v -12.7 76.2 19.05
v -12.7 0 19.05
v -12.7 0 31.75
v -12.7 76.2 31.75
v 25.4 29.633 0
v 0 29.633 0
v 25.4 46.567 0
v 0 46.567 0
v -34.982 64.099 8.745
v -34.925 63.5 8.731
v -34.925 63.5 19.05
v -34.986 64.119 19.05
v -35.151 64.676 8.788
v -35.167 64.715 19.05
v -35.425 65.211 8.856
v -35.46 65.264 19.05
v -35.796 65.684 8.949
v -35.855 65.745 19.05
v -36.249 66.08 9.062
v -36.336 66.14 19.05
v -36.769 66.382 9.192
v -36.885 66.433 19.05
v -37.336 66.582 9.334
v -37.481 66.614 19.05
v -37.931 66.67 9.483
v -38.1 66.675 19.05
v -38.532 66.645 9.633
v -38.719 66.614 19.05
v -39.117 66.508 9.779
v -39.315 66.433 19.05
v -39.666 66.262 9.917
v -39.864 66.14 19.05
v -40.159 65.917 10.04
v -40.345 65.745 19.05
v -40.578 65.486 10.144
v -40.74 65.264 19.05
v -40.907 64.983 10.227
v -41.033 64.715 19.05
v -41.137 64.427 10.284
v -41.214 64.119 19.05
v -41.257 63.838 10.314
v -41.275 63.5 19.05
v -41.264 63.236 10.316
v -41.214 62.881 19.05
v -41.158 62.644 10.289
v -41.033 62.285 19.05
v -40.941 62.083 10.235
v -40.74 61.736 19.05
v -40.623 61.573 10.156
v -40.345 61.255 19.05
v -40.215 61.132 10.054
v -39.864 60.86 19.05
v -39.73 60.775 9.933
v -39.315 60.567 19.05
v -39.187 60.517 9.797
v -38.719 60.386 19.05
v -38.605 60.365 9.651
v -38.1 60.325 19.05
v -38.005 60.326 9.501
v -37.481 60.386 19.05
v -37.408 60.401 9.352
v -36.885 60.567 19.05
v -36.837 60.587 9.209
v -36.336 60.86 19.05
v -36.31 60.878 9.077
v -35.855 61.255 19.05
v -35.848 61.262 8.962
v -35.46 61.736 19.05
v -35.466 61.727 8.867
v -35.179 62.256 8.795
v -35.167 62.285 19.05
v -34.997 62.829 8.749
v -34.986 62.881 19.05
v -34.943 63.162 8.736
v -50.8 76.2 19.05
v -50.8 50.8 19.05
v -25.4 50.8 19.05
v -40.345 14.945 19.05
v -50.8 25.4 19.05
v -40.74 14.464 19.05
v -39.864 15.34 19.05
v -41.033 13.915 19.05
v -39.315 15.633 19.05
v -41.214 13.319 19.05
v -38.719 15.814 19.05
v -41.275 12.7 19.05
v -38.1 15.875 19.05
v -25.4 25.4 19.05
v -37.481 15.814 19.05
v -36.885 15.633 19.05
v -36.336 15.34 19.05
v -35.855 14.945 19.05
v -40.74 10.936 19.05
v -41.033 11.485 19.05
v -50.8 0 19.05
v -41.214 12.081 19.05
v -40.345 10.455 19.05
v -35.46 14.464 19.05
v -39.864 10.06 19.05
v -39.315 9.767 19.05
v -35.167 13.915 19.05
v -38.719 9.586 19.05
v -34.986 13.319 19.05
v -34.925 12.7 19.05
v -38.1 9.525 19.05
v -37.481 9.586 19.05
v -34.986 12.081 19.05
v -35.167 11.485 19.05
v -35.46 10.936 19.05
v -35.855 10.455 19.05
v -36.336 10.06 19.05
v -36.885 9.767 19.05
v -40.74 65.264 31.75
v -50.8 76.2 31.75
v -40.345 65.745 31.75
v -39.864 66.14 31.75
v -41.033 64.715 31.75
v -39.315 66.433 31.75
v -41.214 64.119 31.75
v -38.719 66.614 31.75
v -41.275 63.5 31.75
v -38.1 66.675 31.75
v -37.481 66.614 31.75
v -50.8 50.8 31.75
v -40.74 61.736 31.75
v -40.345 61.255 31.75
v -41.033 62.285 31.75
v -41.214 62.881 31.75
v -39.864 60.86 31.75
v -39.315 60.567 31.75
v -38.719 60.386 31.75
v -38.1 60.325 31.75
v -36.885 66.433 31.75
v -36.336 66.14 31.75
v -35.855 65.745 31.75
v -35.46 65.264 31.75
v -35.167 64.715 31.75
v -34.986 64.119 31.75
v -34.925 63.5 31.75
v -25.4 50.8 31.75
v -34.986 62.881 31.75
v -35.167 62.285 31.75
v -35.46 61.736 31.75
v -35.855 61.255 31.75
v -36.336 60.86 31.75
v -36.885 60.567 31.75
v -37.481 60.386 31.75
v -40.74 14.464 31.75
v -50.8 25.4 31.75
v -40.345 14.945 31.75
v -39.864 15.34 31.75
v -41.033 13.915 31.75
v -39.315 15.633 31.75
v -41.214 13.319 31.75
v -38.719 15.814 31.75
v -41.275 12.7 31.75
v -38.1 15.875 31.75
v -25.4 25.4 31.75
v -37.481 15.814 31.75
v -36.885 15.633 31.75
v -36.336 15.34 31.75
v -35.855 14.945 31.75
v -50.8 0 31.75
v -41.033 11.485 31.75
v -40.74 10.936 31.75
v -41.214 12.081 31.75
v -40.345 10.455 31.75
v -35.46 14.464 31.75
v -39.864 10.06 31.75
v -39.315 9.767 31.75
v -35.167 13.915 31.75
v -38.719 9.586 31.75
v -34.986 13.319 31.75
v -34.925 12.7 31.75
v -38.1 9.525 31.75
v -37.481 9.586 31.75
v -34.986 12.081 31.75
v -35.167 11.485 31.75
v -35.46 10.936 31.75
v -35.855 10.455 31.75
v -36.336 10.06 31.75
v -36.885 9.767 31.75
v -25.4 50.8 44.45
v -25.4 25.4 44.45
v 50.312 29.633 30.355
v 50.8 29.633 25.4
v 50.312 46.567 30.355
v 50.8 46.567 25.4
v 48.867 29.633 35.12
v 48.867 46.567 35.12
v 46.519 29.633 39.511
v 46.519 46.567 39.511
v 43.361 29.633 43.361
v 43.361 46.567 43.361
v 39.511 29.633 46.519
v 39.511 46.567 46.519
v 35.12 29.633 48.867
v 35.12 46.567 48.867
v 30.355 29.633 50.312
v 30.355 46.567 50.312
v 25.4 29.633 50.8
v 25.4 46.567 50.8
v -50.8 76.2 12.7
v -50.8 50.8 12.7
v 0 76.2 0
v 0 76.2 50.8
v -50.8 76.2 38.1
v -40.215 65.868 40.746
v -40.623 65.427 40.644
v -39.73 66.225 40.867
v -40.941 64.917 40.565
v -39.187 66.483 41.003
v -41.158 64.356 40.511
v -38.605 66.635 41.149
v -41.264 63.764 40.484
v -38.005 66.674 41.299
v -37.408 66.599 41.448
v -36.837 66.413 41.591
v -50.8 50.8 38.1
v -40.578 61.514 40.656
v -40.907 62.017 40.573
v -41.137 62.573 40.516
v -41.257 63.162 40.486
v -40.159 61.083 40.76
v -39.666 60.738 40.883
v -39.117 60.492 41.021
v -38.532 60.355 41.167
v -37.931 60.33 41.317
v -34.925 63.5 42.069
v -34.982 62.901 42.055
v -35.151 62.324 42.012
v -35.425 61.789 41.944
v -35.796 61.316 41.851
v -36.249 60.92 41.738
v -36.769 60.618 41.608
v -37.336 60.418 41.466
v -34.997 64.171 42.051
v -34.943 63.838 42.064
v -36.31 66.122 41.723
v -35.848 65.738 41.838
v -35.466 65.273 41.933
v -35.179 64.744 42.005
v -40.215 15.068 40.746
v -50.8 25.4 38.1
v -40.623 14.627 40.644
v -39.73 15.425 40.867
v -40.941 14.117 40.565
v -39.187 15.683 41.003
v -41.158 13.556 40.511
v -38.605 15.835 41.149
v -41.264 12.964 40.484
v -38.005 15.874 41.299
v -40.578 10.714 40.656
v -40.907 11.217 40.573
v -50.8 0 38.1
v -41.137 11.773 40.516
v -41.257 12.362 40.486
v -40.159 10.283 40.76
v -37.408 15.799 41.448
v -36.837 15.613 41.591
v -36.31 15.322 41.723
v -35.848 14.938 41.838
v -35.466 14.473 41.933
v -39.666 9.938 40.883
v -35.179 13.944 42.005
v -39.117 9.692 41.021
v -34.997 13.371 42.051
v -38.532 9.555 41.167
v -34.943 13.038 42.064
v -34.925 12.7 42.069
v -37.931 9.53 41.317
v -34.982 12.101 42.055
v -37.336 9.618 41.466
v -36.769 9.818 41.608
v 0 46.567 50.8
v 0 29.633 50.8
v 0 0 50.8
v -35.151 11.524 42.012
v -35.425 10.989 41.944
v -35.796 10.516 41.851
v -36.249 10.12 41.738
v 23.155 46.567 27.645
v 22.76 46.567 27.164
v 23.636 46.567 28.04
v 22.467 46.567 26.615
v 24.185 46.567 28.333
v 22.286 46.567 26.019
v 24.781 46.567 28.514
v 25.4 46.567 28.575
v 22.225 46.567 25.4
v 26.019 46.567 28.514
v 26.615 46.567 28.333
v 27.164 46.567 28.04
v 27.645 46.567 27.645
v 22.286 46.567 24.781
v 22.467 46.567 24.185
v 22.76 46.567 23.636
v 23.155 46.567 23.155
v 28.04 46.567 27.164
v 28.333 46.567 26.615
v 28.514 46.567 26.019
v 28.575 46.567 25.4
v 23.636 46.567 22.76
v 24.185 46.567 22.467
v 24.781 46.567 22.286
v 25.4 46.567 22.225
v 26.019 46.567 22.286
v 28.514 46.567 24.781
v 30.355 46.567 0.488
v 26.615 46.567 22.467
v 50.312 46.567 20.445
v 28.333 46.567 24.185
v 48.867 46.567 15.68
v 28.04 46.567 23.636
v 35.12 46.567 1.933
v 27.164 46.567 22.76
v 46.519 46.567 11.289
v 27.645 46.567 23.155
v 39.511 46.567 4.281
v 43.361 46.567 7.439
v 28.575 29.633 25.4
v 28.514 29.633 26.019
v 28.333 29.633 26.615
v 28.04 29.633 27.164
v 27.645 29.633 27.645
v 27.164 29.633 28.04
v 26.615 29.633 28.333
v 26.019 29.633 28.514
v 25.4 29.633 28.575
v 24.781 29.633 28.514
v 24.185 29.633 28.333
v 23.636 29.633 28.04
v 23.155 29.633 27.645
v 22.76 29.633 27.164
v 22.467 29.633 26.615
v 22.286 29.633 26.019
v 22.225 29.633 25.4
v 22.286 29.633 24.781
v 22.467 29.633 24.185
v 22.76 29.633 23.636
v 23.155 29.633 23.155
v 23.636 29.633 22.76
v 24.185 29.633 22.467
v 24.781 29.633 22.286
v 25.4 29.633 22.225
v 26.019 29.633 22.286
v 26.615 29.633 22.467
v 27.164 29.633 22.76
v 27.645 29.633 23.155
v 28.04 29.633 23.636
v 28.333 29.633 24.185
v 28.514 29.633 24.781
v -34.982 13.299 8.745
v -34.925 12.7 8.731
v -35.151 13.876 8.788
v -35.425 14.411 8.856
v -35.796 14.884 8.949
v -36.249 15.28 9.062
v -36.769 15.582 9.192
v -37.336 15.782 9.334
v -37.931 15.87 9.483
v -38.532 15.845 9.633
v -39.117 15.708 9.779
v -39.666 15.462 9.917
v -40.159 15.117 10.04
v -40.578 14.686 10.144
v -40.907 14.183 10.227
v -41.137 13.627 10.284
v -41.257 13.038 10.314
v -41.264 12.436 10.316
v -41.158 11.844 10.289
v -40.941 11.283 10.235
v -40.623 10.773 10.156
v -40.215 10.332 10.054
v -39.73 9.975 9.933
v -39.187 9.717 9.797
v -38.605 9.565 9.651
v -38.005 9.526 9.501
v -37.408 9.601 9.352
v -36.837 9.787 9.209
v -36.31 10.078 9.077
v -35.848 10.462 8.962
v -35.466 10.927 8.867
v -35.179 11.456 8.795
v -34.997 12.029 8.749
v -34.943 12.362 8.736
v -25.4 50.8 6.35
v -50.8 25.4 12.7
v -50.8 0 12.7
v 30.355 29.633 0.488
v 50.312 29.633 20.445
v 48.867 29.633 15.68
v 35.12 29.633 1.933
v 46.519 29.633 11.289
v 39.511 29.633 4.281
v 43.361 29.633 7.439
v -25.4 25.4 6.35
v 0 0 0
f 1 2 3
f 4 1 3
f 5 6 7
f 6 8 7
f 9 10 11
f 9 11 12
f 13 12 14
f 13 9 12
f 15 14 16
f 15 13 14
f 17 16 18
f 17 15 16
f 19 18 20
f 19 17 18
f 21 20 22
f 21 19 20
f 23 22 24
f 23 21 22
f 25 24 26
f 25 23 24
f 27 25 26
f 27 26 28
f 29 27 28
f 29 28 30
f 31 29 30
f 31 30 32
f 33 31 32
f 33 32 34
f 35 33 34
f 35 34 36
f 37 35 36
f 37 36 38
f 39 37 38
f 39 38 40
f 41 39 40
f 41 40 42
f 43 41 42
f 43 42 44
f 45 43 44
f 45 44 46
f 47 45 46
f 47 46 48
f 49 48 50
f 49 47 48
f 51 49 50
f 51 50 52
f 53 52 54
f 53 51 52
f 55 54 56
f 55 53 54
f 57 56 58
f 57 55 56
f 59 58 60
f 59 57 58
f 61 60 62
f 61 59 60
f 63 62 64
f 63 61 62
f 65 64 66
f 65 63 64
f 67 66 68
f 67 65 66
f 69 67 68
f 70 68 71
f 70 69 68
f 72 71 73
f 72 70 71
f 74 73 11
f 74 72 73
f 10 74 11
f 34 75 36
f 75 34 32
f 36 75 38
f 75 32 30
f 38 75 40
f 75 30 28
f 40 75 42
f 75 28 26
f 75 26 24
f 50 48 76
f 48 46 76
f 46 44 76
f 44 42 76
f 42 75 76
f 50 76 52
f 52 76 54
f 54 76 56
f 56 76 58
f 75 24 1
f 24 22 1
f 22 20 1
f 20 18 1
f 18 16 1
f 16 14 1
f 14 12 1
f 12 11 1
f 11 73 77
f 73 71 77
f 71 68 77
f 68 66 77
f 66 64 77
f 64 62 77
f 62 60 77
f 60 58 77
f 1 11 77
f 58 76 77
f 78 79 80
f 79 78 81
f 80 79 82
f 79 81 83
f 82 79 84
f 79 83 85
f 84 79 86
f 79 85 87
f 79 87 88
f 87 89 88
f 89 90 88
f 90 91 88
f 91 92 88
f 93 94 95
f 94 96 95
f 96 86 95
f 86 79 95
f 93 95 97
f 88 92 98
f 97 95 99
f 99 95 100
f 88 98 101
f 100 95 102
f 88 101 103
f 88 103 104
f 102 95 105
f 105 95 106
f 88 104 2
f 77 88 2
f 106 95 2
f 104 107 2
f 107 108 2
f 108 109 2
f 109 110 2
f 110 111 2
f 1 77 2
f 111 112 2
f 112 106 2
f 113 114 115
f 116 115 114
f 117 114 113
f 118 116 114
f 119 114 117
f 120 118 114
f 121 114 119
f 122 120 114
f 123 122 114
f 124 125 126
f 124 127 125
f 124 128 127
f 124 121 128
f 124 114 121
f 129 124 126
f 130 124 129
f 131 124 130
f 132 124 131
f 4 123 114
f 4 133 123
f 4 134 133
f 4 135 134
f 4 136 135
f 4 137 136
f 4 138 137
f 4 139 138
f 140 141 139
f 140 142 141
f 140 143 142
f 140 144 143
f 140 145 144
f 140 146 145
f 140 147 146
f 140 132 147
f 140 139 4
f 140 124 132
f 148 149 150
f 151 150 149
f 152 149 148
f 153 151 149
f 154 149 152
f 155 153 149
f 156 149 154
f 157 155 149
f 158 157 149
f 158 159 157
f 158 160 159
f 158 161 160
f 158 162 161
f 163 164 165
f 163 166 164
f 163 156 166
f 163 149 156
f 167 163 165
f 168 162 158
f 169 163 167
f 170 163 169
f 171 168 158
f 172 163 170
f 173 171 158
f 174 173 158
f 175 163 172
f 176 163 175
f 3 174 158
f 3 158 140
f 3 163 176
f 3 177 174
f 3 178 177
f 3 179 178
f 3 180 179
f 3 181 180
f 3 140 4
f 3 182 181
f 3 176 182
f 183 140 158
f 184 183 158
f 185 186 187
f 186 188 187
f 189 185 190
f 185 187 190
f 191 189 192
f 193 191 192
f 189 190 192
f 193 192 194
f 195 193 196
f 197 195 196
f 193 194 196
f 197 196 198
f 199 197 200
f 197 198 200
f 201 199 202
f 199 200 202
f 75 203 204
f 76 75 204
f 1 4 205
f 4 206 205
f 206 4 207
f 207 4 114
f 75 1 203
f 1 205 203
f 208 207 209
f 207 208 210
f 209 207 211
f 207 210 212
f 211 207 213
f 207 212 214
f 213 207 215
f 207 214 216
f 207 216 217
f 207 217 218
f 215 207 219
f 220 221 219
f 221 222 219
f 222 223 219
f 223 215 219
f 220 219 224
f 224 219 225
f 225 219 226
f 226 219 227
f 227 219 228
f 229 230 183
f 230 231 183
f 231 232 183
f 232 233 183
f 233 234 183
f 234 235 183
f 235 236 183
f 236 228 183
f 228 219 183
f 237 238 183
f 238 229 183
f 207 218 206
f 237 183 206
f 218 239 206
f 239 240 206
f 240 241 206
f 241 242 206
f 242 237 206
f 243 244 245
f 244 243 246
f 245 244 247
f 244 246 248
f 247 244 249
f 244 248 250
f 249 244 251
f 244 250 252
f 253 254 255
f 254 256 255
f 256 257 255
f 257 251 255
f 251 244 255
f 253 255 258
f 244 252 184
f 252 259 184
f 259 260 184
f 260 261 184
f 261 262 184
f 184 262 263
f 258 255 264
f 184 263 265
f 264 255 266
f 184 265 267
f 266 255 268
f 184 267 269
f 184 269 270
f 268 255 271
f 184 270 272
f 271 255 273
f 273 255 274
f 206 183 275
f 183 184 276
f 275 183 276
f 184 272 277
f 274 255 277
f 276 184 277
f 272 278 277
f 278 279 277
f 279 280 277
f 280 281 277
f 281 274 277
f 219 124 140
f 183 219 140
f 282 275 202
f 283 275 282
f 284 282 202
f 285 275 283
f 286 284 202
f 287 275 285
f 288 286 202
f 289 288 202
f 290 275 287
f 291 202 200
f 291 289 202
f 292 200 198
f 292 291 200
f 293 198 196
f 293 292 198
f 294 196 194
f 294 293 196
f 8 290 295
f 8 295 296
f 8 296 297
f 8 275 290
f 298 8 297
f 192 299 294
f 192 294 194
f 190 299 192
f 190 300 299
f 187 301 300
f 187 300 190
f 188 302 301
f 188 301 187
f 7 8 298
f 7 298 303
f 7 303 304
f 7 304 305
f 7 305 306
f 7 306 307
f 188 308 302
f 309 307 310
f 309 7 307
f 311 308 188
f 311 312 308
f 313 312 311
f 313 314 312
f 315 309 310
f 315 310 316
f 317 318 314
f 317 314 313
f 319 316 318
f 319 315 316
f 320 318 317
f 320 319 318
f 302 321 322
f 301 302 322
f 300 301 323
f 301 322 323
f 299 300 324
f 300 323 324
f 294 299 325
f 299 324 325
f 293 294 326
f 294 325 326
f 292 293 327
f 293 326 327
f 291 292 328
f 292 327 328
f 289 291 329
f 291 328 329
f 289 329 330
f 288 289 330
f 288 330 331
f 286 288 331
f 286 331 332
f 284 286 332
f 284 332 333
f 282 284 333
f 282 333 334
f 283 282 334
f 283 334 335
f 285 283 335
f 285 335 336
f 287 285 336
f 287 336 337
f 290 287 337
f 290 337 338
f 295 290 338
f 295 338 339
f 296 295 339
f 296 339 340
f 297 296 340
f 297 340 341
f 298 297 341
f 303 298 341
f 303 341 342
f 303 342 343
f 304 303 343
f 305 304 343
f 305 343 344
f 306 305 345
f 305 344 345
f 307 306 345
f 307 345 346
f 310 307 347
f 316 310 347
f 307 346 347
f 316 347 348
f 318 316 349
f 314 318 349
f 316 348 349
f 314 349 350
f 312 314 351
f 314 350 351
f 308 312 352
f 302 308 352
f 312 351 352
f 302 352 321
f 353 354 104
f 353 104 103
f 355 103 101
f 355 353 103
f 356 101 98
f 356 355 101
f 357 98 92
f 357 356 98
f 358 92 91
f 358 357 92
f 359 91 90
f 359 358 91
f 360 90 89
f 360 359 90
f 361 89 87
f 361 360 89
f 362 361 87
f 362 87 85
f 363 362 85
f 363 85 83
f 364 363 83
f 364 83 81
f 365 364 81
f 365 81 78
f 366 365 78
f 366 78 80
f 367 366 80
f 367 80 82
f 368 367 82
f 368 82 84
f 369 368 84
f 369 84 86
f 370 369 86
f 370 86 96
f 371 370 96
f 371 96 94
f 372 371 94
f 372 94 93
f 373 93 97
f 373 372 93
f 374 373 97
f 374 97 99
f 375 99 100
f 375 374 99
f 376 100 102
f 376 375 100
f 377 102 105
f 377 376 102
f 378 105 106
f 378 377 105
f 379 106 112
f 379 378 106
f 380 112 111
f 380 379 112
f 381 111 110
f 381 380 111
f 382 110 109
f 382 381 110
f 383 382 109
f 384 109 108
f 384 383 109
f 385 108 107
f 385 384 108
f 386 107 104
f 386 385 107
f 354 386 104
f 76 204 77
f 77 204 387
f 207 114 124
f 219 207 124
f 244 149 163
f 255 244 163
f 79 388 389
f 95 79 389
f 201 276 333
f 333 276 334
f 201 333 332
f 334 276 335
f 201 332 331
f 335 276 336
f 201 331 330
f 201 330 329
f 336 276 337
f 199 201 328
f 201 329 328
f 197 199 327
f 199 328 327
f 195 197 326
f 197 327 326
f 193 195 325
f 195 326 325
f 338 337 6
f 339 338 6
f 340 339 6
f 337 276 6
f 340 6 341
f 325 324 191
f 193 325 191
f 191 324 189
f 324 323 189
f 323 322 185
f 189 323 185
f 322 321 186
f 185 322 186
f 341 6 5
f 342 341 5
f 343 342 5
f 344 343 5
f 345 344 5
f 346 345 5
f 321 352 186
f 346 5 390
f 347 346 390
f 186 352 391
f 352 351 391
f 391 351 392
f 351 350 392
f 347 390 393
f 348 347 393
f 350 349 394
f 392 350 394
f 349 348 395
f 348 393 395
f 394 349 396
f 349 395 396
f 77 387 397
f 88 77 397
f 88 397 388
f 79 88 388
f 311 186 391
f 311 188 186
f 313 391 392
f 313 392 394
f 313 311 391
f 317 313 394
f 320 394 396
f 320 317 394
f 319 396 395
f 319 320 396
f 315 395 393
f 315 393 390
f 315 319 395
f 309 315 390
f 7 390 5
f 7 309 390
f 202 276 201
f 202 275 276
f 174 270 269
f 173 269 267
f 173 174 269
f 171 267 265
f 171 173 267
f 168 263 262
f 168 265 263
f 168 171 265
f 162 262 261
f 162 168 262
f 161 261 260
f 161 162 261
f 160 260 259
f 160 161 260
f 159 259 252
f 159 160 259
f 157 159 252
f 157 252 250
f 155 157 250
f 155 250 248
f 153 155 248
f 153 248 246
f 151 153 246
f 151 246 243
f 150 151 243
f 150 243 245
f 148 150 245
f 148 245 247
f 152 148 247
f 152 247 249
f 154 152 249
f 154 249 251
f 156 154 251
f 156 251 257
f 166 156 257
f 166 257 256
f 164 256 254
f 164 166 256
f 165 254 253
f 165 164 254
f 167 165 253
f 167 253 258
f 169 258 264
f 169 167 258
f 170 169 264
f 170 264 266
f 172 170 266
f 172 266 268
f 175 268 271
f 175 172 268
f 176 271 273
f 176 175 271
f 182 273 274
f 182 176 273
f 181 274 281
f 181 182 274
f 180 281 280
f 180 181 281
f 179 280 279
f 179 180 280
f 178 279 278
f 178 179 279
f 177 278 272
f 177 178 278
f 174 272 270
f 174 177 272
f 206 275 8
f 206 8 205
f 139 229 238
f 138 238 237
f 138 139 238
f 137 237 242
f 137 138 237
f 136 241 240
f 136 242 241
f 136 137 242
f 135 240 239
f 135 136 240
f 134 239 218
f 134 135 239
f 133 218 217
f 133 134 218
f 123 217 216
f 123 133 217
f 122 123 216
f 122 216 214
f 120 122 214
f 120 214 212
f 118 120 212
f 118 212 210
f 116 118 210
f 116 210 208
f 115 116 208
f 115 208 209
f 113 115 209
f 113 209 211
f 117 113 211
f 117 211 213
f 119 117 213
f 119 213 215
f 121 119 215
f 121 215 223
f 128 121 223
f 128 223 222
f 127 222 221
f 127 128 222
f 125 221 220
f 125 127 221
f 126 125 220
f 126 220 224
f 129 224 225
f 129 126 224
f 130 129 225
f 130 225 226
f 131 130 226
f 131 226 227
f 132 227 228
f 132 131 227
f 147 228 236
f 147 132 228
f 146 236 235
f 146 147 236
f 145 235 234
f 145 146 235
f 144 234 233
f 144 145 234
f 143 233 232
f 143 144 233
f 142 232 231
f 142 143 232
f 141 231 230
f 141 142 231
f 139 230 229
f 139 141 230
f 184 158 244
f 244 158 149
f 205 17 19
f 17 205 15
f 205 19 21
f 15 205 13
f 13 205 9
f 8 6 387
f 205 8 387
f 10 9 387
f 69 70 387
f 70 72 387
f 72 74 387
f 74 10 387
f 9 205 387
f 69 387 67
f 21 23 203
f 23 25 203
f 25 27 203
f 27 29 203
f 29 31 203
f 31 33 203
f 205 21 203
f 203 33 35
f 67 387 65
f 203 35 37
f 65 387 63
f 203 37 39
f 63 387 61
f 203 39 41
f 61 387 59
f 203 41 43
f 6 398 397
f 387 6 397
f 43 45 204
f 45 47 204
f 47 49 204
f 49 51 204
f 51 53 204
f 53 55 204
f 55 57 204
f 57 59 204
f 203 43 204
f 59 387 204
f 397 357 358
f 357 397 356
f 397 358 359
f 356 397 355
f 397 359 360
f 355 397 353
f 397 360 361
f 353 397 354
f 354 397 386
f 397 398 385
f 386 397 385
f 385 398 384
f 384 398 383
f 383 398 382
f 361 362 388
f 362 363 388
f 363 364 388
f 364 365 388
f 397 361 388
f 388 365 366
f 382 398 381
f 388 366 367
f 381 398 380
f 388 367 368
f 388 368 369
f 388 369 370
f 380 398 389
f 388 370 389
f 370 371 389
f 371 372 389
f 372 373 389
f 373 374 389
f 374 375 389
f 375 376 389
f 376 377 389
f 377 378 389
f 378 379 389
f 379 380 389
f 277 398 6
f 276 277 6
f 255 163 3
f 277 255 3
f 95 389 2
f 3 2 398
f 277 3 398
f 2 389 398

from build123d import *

# Parameters (mm, degrees)
F0_W      = 50.8
F0_H      = 16.9333164
F1_DEPTH  = 50.8
F2_R      = 25.39999
F4_DEPTH  = 119.50414
F5_R      = 3.175
F6_DEPTH  = 61.82298
F7_R      = 3.175
F8_DEPTH  = 63.51287
F9_W      = 38.1
F9_H      = 12.7
F10_DEPTH = 114.99064


# Not quite as in the source:
# - a fillet or chamfer is up to 0.001 mm smaller than in the source, because OpenCascade refuses the exact size


with BuildPart() as f1:
    # F0 (on Top) → F1 (new body)
    with BuildSketch(Plane.XY):
        Polygon((-50.8, 0), (0, 0), (0, 29.633350436), (0, 46.566666836), (0, 76.2), (-50.8, 76.2), (-50.8, 50.8), (-25.4, 50.8), (-25.4, 25.4), (-50.8, 25.4), align=None)
        with Locations((25.4, 38.100008636)):
            Rectangle(F0_W, F0_H)
    extrude(amount=F1_DEPTH)

    # F2 (radius 25.4 in the source; OpenCascade refuses exactly that, so slightly less here)
    f2_edges = [f1.edges().sort_by_distance(p)[0] for p in [
        (50.8, 38.100009, 50.8),
        (50.8, 38.100009, 0),
    ]]
    fillet(f2_edges, radius=F2_R)

    # F3 (on face) → F4 (cut)
    with BuildSketch(Plane.XZ):
        Polygon((-50.8, 50.8), (-50.8, 38.1), (0, 50.8), align=None)
        Polygon((0, 0), (-50.8, 12.7), (-50.8, 0), align=None)
    extrude(amount=-F4_DEPTH, mode=Mode.SUBTRACT)

    # F5 (on face) → F6 (cut)
    with BuildSketch(Plane.XZ.offset(-29.633350436)):
        with Locations((25.4, 25.4)):
            Circle(F5_R)
    extrude(amount=-F6_DEPTH, mode=Mode.SUBTRACT)

    # F7 (on face) → F8 (cut)
    with BuildSketch(Plane.XY):
        with Locations((-38.1, 12.7)):
            Circle(F7_R)
        with Locations((-38.1, 63.5)):
            Circle(F7_R)
    extrude(amount=F8_DEPTH, mode=Mode.SUBTRACT)

    # F9 (on face) → F10 (cut)
    with BuildSketch(Plane.XZ):
        with Locations((-31.75, 25.4)):
            Rectangle(F9_W, F9_H)
    extrude(amount=-F10_DEPTH, mode=Mode.SUBTRACT)


solid = f1.part
